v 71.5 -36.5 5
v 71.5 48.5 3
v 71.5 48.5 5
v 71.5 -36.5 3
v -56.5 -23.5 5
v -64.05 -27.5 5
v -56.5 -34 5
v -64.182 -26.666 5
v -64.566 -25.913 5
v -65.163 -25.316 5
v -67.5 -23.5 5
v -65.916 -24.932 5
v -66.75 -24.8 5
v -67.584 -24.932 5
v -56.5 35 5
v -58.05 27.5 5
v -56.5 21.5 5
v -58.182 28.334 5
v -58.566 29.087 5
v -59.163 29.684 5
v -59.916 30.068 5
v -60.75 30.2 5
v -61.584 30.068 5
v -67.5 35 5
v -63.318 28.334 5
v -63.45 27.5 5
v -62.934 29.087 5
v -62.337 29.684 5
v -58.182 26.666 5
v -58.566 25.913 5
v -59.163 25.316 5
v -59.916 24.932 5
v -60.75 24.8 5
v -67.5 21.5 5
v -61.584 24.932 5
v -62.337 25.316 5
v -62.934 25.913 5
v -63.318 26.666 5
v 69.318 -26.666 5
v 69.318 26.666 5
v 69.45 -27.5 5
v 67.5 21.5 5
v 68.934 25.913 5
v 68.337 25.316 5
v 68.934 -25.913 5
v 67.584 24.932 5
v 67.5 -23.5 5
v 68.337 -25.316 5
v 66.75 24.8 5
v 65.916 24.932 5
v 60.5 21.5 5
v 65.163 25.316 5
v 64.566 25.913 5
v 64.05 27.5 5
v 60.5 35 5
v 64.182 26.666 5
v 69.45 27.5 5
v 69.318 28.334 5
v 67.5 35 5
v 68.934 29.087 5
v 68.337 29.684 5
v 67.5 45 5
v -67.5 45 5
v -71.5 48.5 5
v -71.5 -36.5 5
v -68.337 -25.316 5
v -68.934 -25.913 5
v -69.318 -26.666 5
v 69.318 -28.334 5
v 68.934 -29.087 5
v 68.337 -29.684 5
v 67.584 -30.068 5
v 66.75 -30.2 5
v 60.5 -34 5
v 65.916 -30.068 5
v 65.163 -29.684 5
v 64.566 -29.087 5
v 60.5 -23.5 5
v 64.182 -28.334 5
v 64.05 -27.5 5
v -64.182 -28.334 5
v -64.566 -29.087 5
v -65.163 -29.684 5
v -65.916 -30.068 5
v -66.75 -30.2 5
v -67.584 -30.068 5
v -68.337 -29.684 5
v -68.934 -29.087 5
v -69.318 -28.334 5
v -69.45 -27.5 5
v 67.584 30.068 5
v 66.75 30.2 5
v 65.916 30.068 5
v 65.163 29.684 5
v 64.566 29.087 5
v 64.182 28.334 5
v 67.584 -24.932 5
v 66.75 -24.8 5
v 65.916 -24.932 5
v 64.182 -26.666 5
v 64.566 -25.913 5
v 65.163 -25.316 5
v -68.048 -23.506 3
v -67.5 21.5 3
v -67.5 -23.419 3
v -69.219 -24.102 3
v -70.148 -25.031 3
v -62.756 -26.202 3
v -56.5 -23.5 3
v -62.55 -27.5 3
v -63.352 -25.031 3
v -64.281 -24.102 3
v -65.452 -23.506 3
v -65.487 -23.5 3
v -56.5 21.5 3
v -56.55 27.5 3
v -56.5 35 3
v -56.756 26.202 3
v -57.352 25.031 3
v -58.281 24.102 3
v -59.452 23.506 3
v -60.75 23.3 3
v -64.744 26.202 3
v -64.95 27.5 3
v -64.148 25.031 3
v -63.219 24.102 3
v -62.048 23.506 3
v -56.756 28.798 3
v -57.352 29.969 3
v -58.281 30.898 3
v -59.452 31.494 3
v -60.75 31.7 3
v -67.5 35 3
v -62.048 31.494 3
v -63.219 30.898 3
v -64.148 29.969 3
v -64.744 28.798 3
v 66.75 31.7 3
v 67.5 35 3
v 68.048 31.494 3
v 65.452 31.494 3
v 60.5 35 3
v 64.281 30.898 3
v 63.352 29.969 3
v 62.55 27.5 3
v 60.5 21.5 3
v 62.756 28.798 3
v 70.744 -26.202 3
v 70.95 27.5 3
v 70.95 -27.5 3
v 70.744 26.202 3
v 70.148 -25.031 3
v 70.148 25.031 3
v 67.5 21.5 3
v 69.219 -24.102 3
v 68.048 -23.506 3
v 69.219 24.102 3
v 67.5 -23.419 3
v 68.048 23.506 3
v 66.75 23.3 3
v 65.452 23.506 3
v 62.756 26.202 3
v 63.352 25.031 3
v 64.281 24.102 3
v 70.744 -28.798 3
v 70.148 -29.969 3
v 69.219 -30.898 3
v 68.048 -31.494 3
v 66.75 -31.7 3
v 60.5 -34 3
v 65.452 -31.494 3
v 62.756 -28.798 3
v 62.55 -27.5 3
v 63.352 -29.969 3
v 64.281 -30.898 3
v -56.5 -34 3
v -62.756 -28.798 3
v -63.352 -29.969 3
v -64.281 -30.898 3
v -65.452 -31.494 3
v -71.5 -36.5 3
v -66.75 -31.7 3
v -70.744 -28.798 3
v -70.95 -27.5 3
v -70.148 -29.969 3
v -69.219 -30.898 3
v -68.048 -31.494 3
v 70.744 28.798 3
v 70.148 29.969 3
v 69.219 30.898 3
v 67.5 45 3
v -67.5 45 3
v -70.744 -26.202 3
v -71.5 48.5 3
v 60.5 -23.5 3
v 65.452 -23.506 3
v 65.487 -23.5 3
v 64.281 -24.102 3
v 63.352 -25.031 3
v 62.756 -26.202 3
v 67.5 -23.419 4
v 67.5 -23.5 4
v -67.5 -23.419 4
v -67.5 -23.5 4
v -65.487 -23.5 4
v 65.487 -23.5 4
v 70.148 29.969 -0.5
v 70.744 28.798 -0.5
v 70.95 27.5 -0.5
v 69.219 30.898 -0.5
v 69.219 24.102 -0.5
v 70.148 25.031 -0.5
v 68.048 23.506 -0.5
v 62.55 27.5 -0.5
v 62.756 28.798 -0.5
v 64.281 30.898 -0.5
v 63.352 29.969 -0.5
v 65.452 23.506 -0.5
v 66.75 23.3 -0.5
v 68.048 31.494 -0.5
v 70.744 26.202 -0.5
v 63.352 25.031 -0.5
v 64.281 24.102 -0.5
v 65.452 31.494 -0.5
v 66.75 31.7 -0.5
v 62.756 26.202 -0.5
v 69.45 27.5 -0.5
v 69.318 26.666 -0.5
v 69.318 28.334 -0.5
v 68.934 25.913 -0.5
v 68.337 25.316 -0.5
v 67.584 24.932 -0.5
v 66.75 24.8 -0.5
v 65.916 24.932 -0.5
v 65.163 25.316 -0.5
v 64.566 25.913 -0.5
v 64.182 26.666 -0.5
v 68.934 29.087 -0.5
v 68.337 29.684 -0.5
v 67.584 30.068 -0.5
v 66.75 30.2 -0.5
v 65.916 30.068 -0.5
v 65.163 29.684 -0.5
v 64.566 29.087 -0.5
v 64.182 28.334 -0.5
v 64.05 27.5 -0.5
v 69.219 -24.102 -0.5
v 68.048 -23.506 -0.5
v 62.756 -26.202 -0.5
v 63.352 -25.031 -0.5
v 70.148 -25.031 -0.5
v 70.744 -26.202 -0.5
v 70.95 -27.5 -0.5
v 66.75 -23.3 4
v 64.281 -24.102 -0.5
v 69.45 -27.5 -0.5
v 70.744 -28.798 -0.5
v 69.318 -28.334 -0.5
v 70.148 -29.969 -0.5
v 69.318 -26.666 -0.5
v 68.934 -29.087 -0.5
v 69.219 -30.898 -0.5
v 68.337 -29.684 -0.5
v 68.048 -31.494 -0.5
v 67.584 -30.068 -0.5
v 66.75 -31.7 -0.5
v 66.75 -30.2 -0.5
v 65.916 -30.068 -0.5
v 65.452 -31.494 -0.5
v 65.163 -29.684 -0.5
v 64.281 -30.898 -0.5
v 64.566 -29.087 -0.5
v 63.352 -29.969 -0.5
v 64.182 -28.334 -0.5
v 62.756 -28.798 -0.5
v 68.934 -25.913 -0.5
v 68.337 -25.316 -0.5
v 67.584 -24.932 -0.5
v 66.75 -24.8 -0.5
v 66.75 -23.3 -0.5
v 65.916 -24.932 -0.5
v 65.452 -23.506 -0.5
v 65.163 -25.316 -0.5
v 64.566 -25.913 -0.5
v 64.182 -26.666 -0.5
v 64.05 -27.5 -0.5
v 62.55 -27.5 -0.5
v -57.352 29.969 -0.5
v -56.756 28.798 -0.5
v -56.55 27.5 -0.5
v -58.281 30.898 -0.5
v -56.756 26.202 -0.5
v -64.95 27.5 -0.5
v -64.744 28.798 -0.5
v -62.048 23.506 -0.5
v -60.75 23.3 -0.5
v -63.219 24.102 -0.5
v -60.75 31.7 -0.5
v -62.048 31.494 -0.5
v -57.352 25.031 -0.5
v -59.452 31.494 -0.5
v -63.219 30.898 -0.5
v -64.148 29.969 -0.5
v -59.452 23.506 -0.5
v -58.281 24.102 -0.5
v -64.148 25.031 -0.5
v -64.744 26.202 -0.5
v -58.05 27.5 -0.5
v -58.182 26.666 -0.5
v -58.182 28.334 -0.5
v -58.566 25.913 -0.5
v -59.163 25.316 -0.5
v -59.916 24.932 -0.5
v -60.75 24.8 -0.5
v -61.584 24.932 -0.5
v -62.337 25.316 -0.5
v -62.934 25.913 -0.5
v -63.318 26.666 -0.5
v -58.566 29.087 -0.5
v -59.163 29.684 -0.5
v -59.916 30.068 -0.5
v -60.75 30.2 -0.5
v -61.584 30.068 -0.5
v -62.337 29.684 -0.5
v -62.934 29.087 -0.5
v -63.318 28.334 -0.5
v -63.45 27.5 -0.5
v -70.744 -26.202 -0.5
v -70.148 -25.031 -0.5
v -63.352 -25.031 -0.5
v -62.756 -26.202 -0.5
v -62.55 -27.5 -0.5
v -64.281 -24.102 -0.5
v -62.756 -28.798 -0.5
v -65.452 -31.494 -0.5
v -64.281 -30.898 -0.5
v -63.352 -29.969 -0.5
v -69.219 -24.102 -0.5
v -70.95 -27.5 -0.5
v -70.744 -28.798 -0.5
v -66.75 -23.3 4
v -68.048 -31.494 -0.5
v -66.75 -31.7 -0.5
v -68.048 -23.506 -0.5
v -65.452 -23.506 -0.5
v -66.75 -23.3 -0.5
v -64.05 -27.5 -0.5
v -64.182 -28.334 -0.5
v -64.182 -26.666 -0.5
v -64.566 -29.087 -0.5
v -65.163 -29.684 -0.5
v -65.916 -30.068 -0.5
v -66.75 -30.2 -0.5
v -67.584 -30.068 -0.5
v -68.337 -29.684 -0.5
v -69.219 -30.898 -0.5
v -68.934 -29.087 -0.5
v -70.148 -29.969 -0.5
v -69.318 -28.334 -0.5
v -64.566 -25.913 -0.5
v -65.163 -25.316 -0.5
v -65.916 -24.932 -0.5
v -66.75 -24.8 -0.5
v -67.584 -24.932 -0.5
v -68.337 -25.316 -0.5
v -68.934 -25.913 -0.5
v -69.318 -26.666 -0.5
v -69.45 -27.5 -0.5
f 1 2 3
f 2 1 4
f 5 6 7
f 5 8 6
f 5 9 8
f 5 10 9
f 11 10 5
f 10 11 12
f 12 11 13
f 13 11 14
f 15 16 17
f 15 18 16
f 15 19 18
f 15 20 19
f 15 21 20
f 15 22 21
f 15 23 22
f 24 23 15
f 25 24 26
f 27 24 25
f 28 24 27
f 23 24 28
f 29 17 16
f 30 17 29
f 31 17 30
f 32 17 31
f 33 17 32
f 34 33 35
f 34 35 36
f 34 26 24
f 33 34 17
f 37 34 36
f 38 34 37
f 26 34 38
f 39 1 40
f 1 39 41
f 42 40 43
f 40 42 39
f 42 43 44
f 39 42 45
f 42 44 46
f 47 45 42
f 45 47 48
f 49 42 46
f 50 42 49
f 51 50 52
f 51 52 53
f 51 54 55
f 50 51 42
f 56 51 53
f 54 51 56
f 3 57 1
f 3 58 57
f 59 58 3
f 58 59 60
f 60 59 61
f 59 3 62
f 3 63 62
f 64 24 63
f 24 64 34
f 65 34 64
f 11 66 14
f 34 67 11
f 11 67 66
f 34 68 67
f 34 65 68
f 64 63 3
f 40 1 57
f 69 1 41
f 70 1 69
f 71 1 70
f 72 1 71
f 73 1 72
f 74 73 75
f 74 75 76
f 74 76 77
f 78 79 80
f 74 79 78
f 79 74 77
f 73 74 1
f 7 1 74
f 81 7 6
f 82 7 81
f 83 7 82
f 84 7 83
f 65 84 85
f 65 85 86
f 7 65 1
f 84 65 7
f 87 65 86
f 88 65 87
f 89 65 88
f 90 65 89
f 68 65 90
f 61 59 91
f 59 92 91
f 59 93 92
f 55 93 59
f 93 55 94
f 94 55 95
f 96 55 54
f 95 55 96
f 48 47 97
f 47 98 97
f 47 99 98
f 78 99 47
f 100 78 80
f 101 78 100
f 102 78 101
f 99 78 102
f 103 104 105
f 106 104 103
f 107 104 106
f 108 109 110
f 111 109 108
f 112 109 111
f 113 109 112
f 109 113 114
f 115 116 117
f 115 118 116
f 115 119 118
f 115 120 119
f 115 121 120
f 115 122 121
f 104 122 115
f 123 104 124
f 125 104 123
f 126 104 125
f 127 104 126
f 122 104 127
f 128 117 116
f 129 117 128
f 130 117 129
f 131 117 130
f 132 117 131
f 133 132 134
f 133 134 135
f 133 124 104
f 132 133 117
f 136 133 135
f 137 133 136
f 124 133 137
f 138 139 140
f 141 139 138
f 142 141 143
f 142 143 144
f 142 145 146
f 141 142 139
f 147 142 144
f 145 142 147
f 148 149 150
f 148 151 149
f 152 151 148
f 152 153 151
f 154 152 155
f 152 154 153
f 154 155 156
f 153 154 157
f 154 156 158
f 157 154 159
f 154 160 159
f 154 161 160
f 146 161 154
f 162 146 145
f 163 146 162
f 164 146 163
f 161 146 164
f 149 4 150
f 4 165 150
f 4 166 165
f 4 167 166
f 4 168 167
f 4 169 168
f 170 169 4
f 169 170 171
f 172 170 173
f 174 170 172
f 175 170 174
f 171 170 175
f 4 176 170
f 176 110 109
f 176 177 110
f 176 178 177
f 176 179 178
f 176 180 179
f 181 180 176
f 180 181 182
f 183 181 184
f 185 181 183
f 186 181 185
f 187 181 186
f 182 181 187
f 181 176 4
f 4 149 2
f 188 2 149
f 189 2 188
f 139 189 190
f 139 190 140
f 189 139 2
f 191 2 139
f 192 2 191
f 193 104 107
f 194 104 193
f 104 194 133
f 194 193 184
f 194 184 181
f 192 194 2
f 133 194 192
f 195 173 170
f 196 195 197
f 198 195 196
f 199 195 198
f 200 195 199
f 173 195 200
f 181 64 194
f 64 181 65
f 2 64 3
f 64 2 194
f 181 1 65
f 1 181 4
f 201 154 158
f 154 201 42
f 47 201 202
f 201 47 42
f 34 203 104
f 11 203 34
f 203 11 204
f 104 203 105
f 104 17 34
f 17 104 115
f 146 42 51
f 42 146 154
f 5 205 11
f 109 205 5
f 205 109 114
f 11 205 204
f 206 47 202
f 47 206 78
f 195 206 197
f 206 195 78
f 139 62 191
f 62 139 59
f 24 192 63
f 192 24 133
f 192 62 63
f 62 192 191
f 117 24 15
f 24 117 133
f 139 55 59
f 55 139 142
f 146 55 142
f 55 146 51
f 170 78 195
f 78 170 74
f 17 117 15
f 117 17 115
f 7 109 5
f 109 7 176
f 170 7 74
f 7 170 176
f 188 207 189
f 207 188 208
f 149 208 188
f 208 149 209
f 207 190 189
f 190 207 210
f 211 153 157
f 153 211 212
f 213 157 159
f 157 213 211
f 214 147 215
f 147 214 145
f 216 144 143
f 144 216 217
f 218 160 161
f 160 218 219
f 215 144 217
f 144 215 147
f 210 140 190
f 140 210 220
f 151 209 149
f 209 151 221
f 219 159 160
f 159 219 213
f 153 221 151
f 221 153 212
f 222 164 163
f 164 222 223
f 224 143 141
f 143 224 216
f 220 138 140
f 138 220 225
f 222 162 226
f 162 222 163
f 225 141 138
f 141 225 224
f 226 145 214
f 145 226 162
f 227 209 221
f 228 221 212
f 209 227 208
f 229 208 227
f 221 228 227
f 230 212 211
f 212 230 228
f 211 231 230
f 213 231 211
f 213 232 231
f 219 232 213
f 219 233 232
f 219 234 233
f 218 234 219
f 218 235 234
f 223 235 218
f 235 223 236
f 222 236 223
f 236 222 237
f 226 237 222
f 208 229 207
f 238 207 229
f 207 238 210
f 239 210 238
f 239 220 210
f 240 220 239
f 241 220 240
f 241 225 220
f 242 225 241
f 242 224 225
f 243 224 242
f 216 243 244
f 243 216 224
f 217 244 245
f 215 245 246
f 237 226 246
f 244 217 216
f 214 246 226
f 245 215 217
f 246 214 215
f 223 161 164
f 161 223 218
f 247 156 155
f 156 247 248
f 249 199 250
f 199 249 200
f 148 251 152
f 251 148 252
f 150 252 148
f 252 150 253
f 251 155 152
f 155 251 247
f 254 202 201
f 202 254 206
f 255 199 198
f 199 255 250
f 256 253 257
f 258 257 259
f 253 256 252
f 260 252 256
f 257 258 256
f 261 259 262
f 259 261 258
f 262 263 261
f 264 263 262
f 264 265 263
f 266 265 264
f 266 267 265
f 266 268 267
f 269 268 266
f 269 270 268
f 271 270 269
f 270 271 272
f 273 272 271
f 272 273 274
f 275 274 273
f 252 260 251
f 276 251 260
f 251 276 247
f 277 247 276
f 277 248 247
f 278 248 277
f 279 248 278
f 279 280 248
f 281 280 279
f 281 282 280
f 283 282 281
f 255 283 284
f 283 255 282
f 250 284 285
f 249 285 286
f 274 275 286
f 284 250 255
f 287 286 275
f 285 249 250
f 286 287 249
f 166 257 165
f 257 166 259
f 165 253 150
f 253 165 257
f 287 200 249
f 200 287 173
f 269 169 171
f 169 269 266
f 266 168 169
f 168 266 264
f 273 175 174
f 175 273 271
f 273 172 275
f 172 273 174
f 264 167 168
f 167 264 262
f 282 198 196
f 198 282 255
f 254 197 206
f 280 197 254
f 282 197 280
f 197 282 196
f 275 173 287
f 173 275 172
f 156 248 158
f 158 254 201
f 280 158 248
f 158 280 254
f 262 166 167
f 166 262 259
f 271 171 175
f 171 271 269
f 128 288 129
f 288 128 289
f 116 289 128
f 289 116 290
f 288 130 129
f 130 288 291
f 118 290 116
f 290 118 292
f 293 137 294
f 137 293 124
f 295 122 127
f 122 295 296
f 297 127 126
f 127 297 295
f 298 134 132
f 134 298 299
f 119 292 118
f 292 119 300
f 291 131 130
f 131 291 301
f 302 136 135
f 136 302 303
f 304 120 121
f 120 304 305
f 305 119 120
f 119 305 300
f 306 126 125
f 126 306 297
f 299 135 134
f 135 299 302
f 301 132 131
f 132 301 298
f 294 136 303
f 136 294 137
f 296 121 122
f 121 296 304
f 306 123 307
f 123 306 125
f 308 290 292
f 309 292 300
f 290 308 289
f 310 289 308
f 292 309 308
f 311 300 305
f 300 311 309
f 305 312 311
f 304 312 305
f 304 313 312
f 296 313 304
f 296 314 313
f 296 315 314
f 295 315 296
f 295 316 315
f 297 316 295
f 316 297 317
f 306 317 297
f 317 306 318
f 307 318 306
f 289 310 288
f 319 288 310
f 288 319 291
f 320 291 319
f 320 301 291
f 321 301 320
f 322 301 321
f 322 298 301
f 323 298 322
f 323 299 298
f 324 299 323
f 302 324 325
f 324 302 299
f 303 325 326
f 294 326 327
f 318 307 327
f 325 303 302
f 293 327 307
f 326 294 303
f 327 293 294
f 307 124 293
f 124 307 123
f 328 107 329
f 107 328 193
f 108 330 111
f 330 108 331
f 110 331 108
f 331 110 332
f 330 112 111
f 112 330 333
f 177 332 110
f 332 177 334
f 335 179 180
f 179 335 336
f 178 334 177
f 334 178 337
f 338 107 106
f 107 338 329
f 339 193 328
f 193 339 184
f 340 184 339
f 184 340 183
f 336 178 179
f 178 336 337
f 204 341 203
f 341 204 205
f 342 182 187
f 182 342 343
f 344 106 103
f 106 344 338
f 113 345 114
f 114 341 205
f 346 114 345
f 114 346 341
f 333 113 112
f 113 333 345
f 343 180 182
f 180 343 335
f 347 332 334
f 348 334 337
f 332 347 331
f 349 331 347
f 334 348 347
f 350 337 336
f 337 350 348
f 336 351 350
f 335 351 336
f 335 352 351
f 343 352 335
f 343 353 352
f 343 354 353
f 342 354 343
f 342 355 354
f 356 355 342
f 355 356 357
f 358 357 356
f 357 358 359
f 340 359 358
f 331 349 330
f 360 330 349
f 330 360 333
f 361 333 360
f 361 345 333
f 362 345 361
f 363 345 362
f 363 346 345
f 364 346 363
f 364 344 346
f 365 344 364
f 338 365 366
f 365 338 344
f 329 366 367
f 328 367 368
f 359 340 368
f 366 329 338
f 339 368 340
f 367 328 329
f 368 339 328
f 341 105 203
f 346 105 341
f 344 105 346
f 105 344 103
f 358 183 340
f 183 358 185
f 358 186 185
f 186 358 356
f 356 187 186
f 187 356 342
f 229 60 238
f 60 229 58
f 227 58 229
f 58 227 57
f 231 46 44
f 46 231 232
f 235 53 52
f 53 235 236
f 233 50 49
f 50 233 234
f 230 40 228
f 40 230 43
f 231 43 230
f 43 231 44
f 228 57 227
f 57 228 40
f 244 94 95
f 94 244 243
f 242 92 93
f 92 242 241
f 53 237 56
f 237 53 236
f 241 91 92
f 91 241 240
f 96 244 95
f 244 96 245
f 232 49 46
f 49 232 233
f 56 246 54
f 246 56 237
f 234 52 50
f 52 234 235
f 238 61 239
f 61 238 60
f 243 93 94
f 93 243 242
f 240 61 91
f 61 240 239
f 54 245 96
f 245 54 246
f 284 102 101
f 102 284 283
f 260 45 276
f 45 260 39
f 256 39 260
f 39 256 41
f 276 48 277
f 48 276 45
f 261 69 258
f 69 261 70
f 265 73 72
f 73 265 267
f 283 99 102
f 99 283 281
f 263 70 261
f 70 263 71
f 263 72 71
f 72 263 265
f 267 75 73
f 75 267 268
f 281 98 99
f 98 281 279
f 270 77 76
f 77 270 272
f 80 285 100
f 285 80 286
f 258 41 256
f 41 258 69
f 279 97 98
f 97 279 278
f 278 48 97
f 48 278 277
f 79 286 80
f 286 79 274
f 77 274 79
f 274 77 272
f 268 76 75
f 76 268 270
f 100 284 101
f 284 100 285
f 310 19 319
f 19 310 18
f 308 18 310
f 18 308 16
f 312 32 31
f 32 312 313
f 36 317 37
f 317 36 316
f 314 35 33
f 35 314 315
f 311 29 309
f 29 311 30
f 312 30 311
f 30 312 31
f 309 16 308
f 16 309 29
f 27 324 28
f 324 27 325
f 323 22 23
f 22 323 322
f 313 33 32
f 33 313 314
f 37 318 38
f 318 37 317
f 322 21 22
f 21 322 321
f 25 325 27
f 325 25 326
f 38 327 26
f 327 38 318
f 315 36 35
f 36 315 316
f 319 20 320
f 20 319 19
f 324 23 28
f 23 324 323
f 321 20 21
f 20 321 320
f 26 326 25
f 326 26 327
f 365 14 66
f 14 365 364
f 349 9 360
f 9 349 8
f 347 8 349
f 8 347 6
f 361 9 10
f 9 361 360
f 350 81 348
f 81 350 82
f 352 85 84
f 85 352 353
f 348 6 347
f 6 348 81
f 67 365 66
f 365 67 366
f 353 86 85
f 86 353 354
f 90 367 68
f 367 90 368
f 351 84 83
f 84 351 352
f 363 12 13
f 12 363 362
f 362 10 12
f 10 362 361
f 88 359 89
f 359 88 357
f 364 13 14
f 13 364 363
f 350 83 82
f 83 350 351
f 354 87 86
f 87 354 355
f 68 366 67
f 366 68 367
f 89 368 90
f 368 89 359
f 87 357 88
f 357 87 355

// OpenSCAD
$fn=20;

Platform_Width = 143;
Platform_Length = 85;
Platform_Thickness = 2;
Platform_Raise = 2;

Rear_Screw_Distance = 127.5;
Front_Screw_Distance = 133.5;
Front2Rear_Screw_Distance = 55;
Left_Screw_Offset = 11.5;
Rear_Screw_Wall_Distance = 21;

Mounting_Thread_Height = 4.5;
Mounting_Thread_Diameter = 5.4;
Mounting_Thread_Thickness = 3;

/// Modules

module Screw_Column_Solid (screwdiameter,screwheight,thickness){
        cylinder(
            d = screwdiameter+thickness, 
            h = screwheight, 
            center=true);
}



// Create Screw Mounts
module Screw_Mounts (rearw, frontw, l, h, d, t){
    //Rear right
    echo (rearw);
    translate ([frontw/2, l/2,0])
        Screw_Column_Solid (d, h, t);
    //Front right 
    translate ([frontw/2, -l/2,0])
        Screw_Column_Solid (d, h, t);
    //Rear left
    translate ([(frontw/2)-Rear_Screw_Distance, l/2,0])
        Screw_Column_Solid (d, h, t); 
    //Front left
    translate ([-frontw/2, -l/2,0])
        Screw_Column_Solid (d, h, t); 
    //translate ([Side_Mount_Pad+t, -l/2,Side_Mount_Raise])
        //rotate ([0,90,0])
            //Screw_Column (d, h, t); 
}



module Cutout(l,d,t){
    hull(){
        translate([-l/2,0,-t])
            cylinder(d=d, h=t*2);
        translate([l/2,0,-t])
            cylinder(d=d, h=t*2);
        }
}

module Platform (w,l,t){
    difference(){
        cube ([w,l,t], center=true);
//        translate([0,35,0])
//            Cutout(w-20,6,t);
//        translate([0,25,0])
//            Cutout(w-20,6,t);
//        translate([0,10,0])
//            Cutout(w-20,6,t);
//        translate([0,0,0])
//            Cutout(w-20,6,t);
//        translate([0,-10,0])
//            Cutout(w-20,6,t);
//        translate([0,-20,0])
//            Cutout(w-20,6,t);
//        translate([0,-30,0])
//            Cutout(w-20,6,t);
        // Temp block out for test print
        translate([0,-7,0])
            cube([w-8,l-40,t*2], center=true);
        translate([0,34,0])
            cube([w-8,l-75,t*2], center=true);
        translate([2,-1,0])
            cube([w-26,l-7,t*2], center=true);
    }
}


/// Render

translate ([0,0,Platform_Thickness+Platform_Raise])
difference (){
    union(){
        // Base plate
        translate([0,6,0])
            Platform (
                Platform_Width,
                Platform_Length,
                Platform_Thickness);
        // Raised screw mounts
        translate([0,0,-Mounting_Thread_Height/2])
            Screw_Mounts (
                Rear_Screw_Distance, 
                Front_Screw_Distance,
                Front2Rear_Screw_Distance,
                Mounting_Thread_Height,
                Mounting_Thread_Diameter,
                Mounting_Thread_Thickness);
    }
    // Removed screw mounts
    translate ([0,0,-Platform_Thickness])
        Screw_Mounts (
            Rear_Screw_Distance, 
            Front_Screw_Distance,
            Front2Rear_Screw_Distance,
            Mounting_Thread_Height+Platform_Thickness,
            Mounting_Thread_Diameter,
            0);
}
